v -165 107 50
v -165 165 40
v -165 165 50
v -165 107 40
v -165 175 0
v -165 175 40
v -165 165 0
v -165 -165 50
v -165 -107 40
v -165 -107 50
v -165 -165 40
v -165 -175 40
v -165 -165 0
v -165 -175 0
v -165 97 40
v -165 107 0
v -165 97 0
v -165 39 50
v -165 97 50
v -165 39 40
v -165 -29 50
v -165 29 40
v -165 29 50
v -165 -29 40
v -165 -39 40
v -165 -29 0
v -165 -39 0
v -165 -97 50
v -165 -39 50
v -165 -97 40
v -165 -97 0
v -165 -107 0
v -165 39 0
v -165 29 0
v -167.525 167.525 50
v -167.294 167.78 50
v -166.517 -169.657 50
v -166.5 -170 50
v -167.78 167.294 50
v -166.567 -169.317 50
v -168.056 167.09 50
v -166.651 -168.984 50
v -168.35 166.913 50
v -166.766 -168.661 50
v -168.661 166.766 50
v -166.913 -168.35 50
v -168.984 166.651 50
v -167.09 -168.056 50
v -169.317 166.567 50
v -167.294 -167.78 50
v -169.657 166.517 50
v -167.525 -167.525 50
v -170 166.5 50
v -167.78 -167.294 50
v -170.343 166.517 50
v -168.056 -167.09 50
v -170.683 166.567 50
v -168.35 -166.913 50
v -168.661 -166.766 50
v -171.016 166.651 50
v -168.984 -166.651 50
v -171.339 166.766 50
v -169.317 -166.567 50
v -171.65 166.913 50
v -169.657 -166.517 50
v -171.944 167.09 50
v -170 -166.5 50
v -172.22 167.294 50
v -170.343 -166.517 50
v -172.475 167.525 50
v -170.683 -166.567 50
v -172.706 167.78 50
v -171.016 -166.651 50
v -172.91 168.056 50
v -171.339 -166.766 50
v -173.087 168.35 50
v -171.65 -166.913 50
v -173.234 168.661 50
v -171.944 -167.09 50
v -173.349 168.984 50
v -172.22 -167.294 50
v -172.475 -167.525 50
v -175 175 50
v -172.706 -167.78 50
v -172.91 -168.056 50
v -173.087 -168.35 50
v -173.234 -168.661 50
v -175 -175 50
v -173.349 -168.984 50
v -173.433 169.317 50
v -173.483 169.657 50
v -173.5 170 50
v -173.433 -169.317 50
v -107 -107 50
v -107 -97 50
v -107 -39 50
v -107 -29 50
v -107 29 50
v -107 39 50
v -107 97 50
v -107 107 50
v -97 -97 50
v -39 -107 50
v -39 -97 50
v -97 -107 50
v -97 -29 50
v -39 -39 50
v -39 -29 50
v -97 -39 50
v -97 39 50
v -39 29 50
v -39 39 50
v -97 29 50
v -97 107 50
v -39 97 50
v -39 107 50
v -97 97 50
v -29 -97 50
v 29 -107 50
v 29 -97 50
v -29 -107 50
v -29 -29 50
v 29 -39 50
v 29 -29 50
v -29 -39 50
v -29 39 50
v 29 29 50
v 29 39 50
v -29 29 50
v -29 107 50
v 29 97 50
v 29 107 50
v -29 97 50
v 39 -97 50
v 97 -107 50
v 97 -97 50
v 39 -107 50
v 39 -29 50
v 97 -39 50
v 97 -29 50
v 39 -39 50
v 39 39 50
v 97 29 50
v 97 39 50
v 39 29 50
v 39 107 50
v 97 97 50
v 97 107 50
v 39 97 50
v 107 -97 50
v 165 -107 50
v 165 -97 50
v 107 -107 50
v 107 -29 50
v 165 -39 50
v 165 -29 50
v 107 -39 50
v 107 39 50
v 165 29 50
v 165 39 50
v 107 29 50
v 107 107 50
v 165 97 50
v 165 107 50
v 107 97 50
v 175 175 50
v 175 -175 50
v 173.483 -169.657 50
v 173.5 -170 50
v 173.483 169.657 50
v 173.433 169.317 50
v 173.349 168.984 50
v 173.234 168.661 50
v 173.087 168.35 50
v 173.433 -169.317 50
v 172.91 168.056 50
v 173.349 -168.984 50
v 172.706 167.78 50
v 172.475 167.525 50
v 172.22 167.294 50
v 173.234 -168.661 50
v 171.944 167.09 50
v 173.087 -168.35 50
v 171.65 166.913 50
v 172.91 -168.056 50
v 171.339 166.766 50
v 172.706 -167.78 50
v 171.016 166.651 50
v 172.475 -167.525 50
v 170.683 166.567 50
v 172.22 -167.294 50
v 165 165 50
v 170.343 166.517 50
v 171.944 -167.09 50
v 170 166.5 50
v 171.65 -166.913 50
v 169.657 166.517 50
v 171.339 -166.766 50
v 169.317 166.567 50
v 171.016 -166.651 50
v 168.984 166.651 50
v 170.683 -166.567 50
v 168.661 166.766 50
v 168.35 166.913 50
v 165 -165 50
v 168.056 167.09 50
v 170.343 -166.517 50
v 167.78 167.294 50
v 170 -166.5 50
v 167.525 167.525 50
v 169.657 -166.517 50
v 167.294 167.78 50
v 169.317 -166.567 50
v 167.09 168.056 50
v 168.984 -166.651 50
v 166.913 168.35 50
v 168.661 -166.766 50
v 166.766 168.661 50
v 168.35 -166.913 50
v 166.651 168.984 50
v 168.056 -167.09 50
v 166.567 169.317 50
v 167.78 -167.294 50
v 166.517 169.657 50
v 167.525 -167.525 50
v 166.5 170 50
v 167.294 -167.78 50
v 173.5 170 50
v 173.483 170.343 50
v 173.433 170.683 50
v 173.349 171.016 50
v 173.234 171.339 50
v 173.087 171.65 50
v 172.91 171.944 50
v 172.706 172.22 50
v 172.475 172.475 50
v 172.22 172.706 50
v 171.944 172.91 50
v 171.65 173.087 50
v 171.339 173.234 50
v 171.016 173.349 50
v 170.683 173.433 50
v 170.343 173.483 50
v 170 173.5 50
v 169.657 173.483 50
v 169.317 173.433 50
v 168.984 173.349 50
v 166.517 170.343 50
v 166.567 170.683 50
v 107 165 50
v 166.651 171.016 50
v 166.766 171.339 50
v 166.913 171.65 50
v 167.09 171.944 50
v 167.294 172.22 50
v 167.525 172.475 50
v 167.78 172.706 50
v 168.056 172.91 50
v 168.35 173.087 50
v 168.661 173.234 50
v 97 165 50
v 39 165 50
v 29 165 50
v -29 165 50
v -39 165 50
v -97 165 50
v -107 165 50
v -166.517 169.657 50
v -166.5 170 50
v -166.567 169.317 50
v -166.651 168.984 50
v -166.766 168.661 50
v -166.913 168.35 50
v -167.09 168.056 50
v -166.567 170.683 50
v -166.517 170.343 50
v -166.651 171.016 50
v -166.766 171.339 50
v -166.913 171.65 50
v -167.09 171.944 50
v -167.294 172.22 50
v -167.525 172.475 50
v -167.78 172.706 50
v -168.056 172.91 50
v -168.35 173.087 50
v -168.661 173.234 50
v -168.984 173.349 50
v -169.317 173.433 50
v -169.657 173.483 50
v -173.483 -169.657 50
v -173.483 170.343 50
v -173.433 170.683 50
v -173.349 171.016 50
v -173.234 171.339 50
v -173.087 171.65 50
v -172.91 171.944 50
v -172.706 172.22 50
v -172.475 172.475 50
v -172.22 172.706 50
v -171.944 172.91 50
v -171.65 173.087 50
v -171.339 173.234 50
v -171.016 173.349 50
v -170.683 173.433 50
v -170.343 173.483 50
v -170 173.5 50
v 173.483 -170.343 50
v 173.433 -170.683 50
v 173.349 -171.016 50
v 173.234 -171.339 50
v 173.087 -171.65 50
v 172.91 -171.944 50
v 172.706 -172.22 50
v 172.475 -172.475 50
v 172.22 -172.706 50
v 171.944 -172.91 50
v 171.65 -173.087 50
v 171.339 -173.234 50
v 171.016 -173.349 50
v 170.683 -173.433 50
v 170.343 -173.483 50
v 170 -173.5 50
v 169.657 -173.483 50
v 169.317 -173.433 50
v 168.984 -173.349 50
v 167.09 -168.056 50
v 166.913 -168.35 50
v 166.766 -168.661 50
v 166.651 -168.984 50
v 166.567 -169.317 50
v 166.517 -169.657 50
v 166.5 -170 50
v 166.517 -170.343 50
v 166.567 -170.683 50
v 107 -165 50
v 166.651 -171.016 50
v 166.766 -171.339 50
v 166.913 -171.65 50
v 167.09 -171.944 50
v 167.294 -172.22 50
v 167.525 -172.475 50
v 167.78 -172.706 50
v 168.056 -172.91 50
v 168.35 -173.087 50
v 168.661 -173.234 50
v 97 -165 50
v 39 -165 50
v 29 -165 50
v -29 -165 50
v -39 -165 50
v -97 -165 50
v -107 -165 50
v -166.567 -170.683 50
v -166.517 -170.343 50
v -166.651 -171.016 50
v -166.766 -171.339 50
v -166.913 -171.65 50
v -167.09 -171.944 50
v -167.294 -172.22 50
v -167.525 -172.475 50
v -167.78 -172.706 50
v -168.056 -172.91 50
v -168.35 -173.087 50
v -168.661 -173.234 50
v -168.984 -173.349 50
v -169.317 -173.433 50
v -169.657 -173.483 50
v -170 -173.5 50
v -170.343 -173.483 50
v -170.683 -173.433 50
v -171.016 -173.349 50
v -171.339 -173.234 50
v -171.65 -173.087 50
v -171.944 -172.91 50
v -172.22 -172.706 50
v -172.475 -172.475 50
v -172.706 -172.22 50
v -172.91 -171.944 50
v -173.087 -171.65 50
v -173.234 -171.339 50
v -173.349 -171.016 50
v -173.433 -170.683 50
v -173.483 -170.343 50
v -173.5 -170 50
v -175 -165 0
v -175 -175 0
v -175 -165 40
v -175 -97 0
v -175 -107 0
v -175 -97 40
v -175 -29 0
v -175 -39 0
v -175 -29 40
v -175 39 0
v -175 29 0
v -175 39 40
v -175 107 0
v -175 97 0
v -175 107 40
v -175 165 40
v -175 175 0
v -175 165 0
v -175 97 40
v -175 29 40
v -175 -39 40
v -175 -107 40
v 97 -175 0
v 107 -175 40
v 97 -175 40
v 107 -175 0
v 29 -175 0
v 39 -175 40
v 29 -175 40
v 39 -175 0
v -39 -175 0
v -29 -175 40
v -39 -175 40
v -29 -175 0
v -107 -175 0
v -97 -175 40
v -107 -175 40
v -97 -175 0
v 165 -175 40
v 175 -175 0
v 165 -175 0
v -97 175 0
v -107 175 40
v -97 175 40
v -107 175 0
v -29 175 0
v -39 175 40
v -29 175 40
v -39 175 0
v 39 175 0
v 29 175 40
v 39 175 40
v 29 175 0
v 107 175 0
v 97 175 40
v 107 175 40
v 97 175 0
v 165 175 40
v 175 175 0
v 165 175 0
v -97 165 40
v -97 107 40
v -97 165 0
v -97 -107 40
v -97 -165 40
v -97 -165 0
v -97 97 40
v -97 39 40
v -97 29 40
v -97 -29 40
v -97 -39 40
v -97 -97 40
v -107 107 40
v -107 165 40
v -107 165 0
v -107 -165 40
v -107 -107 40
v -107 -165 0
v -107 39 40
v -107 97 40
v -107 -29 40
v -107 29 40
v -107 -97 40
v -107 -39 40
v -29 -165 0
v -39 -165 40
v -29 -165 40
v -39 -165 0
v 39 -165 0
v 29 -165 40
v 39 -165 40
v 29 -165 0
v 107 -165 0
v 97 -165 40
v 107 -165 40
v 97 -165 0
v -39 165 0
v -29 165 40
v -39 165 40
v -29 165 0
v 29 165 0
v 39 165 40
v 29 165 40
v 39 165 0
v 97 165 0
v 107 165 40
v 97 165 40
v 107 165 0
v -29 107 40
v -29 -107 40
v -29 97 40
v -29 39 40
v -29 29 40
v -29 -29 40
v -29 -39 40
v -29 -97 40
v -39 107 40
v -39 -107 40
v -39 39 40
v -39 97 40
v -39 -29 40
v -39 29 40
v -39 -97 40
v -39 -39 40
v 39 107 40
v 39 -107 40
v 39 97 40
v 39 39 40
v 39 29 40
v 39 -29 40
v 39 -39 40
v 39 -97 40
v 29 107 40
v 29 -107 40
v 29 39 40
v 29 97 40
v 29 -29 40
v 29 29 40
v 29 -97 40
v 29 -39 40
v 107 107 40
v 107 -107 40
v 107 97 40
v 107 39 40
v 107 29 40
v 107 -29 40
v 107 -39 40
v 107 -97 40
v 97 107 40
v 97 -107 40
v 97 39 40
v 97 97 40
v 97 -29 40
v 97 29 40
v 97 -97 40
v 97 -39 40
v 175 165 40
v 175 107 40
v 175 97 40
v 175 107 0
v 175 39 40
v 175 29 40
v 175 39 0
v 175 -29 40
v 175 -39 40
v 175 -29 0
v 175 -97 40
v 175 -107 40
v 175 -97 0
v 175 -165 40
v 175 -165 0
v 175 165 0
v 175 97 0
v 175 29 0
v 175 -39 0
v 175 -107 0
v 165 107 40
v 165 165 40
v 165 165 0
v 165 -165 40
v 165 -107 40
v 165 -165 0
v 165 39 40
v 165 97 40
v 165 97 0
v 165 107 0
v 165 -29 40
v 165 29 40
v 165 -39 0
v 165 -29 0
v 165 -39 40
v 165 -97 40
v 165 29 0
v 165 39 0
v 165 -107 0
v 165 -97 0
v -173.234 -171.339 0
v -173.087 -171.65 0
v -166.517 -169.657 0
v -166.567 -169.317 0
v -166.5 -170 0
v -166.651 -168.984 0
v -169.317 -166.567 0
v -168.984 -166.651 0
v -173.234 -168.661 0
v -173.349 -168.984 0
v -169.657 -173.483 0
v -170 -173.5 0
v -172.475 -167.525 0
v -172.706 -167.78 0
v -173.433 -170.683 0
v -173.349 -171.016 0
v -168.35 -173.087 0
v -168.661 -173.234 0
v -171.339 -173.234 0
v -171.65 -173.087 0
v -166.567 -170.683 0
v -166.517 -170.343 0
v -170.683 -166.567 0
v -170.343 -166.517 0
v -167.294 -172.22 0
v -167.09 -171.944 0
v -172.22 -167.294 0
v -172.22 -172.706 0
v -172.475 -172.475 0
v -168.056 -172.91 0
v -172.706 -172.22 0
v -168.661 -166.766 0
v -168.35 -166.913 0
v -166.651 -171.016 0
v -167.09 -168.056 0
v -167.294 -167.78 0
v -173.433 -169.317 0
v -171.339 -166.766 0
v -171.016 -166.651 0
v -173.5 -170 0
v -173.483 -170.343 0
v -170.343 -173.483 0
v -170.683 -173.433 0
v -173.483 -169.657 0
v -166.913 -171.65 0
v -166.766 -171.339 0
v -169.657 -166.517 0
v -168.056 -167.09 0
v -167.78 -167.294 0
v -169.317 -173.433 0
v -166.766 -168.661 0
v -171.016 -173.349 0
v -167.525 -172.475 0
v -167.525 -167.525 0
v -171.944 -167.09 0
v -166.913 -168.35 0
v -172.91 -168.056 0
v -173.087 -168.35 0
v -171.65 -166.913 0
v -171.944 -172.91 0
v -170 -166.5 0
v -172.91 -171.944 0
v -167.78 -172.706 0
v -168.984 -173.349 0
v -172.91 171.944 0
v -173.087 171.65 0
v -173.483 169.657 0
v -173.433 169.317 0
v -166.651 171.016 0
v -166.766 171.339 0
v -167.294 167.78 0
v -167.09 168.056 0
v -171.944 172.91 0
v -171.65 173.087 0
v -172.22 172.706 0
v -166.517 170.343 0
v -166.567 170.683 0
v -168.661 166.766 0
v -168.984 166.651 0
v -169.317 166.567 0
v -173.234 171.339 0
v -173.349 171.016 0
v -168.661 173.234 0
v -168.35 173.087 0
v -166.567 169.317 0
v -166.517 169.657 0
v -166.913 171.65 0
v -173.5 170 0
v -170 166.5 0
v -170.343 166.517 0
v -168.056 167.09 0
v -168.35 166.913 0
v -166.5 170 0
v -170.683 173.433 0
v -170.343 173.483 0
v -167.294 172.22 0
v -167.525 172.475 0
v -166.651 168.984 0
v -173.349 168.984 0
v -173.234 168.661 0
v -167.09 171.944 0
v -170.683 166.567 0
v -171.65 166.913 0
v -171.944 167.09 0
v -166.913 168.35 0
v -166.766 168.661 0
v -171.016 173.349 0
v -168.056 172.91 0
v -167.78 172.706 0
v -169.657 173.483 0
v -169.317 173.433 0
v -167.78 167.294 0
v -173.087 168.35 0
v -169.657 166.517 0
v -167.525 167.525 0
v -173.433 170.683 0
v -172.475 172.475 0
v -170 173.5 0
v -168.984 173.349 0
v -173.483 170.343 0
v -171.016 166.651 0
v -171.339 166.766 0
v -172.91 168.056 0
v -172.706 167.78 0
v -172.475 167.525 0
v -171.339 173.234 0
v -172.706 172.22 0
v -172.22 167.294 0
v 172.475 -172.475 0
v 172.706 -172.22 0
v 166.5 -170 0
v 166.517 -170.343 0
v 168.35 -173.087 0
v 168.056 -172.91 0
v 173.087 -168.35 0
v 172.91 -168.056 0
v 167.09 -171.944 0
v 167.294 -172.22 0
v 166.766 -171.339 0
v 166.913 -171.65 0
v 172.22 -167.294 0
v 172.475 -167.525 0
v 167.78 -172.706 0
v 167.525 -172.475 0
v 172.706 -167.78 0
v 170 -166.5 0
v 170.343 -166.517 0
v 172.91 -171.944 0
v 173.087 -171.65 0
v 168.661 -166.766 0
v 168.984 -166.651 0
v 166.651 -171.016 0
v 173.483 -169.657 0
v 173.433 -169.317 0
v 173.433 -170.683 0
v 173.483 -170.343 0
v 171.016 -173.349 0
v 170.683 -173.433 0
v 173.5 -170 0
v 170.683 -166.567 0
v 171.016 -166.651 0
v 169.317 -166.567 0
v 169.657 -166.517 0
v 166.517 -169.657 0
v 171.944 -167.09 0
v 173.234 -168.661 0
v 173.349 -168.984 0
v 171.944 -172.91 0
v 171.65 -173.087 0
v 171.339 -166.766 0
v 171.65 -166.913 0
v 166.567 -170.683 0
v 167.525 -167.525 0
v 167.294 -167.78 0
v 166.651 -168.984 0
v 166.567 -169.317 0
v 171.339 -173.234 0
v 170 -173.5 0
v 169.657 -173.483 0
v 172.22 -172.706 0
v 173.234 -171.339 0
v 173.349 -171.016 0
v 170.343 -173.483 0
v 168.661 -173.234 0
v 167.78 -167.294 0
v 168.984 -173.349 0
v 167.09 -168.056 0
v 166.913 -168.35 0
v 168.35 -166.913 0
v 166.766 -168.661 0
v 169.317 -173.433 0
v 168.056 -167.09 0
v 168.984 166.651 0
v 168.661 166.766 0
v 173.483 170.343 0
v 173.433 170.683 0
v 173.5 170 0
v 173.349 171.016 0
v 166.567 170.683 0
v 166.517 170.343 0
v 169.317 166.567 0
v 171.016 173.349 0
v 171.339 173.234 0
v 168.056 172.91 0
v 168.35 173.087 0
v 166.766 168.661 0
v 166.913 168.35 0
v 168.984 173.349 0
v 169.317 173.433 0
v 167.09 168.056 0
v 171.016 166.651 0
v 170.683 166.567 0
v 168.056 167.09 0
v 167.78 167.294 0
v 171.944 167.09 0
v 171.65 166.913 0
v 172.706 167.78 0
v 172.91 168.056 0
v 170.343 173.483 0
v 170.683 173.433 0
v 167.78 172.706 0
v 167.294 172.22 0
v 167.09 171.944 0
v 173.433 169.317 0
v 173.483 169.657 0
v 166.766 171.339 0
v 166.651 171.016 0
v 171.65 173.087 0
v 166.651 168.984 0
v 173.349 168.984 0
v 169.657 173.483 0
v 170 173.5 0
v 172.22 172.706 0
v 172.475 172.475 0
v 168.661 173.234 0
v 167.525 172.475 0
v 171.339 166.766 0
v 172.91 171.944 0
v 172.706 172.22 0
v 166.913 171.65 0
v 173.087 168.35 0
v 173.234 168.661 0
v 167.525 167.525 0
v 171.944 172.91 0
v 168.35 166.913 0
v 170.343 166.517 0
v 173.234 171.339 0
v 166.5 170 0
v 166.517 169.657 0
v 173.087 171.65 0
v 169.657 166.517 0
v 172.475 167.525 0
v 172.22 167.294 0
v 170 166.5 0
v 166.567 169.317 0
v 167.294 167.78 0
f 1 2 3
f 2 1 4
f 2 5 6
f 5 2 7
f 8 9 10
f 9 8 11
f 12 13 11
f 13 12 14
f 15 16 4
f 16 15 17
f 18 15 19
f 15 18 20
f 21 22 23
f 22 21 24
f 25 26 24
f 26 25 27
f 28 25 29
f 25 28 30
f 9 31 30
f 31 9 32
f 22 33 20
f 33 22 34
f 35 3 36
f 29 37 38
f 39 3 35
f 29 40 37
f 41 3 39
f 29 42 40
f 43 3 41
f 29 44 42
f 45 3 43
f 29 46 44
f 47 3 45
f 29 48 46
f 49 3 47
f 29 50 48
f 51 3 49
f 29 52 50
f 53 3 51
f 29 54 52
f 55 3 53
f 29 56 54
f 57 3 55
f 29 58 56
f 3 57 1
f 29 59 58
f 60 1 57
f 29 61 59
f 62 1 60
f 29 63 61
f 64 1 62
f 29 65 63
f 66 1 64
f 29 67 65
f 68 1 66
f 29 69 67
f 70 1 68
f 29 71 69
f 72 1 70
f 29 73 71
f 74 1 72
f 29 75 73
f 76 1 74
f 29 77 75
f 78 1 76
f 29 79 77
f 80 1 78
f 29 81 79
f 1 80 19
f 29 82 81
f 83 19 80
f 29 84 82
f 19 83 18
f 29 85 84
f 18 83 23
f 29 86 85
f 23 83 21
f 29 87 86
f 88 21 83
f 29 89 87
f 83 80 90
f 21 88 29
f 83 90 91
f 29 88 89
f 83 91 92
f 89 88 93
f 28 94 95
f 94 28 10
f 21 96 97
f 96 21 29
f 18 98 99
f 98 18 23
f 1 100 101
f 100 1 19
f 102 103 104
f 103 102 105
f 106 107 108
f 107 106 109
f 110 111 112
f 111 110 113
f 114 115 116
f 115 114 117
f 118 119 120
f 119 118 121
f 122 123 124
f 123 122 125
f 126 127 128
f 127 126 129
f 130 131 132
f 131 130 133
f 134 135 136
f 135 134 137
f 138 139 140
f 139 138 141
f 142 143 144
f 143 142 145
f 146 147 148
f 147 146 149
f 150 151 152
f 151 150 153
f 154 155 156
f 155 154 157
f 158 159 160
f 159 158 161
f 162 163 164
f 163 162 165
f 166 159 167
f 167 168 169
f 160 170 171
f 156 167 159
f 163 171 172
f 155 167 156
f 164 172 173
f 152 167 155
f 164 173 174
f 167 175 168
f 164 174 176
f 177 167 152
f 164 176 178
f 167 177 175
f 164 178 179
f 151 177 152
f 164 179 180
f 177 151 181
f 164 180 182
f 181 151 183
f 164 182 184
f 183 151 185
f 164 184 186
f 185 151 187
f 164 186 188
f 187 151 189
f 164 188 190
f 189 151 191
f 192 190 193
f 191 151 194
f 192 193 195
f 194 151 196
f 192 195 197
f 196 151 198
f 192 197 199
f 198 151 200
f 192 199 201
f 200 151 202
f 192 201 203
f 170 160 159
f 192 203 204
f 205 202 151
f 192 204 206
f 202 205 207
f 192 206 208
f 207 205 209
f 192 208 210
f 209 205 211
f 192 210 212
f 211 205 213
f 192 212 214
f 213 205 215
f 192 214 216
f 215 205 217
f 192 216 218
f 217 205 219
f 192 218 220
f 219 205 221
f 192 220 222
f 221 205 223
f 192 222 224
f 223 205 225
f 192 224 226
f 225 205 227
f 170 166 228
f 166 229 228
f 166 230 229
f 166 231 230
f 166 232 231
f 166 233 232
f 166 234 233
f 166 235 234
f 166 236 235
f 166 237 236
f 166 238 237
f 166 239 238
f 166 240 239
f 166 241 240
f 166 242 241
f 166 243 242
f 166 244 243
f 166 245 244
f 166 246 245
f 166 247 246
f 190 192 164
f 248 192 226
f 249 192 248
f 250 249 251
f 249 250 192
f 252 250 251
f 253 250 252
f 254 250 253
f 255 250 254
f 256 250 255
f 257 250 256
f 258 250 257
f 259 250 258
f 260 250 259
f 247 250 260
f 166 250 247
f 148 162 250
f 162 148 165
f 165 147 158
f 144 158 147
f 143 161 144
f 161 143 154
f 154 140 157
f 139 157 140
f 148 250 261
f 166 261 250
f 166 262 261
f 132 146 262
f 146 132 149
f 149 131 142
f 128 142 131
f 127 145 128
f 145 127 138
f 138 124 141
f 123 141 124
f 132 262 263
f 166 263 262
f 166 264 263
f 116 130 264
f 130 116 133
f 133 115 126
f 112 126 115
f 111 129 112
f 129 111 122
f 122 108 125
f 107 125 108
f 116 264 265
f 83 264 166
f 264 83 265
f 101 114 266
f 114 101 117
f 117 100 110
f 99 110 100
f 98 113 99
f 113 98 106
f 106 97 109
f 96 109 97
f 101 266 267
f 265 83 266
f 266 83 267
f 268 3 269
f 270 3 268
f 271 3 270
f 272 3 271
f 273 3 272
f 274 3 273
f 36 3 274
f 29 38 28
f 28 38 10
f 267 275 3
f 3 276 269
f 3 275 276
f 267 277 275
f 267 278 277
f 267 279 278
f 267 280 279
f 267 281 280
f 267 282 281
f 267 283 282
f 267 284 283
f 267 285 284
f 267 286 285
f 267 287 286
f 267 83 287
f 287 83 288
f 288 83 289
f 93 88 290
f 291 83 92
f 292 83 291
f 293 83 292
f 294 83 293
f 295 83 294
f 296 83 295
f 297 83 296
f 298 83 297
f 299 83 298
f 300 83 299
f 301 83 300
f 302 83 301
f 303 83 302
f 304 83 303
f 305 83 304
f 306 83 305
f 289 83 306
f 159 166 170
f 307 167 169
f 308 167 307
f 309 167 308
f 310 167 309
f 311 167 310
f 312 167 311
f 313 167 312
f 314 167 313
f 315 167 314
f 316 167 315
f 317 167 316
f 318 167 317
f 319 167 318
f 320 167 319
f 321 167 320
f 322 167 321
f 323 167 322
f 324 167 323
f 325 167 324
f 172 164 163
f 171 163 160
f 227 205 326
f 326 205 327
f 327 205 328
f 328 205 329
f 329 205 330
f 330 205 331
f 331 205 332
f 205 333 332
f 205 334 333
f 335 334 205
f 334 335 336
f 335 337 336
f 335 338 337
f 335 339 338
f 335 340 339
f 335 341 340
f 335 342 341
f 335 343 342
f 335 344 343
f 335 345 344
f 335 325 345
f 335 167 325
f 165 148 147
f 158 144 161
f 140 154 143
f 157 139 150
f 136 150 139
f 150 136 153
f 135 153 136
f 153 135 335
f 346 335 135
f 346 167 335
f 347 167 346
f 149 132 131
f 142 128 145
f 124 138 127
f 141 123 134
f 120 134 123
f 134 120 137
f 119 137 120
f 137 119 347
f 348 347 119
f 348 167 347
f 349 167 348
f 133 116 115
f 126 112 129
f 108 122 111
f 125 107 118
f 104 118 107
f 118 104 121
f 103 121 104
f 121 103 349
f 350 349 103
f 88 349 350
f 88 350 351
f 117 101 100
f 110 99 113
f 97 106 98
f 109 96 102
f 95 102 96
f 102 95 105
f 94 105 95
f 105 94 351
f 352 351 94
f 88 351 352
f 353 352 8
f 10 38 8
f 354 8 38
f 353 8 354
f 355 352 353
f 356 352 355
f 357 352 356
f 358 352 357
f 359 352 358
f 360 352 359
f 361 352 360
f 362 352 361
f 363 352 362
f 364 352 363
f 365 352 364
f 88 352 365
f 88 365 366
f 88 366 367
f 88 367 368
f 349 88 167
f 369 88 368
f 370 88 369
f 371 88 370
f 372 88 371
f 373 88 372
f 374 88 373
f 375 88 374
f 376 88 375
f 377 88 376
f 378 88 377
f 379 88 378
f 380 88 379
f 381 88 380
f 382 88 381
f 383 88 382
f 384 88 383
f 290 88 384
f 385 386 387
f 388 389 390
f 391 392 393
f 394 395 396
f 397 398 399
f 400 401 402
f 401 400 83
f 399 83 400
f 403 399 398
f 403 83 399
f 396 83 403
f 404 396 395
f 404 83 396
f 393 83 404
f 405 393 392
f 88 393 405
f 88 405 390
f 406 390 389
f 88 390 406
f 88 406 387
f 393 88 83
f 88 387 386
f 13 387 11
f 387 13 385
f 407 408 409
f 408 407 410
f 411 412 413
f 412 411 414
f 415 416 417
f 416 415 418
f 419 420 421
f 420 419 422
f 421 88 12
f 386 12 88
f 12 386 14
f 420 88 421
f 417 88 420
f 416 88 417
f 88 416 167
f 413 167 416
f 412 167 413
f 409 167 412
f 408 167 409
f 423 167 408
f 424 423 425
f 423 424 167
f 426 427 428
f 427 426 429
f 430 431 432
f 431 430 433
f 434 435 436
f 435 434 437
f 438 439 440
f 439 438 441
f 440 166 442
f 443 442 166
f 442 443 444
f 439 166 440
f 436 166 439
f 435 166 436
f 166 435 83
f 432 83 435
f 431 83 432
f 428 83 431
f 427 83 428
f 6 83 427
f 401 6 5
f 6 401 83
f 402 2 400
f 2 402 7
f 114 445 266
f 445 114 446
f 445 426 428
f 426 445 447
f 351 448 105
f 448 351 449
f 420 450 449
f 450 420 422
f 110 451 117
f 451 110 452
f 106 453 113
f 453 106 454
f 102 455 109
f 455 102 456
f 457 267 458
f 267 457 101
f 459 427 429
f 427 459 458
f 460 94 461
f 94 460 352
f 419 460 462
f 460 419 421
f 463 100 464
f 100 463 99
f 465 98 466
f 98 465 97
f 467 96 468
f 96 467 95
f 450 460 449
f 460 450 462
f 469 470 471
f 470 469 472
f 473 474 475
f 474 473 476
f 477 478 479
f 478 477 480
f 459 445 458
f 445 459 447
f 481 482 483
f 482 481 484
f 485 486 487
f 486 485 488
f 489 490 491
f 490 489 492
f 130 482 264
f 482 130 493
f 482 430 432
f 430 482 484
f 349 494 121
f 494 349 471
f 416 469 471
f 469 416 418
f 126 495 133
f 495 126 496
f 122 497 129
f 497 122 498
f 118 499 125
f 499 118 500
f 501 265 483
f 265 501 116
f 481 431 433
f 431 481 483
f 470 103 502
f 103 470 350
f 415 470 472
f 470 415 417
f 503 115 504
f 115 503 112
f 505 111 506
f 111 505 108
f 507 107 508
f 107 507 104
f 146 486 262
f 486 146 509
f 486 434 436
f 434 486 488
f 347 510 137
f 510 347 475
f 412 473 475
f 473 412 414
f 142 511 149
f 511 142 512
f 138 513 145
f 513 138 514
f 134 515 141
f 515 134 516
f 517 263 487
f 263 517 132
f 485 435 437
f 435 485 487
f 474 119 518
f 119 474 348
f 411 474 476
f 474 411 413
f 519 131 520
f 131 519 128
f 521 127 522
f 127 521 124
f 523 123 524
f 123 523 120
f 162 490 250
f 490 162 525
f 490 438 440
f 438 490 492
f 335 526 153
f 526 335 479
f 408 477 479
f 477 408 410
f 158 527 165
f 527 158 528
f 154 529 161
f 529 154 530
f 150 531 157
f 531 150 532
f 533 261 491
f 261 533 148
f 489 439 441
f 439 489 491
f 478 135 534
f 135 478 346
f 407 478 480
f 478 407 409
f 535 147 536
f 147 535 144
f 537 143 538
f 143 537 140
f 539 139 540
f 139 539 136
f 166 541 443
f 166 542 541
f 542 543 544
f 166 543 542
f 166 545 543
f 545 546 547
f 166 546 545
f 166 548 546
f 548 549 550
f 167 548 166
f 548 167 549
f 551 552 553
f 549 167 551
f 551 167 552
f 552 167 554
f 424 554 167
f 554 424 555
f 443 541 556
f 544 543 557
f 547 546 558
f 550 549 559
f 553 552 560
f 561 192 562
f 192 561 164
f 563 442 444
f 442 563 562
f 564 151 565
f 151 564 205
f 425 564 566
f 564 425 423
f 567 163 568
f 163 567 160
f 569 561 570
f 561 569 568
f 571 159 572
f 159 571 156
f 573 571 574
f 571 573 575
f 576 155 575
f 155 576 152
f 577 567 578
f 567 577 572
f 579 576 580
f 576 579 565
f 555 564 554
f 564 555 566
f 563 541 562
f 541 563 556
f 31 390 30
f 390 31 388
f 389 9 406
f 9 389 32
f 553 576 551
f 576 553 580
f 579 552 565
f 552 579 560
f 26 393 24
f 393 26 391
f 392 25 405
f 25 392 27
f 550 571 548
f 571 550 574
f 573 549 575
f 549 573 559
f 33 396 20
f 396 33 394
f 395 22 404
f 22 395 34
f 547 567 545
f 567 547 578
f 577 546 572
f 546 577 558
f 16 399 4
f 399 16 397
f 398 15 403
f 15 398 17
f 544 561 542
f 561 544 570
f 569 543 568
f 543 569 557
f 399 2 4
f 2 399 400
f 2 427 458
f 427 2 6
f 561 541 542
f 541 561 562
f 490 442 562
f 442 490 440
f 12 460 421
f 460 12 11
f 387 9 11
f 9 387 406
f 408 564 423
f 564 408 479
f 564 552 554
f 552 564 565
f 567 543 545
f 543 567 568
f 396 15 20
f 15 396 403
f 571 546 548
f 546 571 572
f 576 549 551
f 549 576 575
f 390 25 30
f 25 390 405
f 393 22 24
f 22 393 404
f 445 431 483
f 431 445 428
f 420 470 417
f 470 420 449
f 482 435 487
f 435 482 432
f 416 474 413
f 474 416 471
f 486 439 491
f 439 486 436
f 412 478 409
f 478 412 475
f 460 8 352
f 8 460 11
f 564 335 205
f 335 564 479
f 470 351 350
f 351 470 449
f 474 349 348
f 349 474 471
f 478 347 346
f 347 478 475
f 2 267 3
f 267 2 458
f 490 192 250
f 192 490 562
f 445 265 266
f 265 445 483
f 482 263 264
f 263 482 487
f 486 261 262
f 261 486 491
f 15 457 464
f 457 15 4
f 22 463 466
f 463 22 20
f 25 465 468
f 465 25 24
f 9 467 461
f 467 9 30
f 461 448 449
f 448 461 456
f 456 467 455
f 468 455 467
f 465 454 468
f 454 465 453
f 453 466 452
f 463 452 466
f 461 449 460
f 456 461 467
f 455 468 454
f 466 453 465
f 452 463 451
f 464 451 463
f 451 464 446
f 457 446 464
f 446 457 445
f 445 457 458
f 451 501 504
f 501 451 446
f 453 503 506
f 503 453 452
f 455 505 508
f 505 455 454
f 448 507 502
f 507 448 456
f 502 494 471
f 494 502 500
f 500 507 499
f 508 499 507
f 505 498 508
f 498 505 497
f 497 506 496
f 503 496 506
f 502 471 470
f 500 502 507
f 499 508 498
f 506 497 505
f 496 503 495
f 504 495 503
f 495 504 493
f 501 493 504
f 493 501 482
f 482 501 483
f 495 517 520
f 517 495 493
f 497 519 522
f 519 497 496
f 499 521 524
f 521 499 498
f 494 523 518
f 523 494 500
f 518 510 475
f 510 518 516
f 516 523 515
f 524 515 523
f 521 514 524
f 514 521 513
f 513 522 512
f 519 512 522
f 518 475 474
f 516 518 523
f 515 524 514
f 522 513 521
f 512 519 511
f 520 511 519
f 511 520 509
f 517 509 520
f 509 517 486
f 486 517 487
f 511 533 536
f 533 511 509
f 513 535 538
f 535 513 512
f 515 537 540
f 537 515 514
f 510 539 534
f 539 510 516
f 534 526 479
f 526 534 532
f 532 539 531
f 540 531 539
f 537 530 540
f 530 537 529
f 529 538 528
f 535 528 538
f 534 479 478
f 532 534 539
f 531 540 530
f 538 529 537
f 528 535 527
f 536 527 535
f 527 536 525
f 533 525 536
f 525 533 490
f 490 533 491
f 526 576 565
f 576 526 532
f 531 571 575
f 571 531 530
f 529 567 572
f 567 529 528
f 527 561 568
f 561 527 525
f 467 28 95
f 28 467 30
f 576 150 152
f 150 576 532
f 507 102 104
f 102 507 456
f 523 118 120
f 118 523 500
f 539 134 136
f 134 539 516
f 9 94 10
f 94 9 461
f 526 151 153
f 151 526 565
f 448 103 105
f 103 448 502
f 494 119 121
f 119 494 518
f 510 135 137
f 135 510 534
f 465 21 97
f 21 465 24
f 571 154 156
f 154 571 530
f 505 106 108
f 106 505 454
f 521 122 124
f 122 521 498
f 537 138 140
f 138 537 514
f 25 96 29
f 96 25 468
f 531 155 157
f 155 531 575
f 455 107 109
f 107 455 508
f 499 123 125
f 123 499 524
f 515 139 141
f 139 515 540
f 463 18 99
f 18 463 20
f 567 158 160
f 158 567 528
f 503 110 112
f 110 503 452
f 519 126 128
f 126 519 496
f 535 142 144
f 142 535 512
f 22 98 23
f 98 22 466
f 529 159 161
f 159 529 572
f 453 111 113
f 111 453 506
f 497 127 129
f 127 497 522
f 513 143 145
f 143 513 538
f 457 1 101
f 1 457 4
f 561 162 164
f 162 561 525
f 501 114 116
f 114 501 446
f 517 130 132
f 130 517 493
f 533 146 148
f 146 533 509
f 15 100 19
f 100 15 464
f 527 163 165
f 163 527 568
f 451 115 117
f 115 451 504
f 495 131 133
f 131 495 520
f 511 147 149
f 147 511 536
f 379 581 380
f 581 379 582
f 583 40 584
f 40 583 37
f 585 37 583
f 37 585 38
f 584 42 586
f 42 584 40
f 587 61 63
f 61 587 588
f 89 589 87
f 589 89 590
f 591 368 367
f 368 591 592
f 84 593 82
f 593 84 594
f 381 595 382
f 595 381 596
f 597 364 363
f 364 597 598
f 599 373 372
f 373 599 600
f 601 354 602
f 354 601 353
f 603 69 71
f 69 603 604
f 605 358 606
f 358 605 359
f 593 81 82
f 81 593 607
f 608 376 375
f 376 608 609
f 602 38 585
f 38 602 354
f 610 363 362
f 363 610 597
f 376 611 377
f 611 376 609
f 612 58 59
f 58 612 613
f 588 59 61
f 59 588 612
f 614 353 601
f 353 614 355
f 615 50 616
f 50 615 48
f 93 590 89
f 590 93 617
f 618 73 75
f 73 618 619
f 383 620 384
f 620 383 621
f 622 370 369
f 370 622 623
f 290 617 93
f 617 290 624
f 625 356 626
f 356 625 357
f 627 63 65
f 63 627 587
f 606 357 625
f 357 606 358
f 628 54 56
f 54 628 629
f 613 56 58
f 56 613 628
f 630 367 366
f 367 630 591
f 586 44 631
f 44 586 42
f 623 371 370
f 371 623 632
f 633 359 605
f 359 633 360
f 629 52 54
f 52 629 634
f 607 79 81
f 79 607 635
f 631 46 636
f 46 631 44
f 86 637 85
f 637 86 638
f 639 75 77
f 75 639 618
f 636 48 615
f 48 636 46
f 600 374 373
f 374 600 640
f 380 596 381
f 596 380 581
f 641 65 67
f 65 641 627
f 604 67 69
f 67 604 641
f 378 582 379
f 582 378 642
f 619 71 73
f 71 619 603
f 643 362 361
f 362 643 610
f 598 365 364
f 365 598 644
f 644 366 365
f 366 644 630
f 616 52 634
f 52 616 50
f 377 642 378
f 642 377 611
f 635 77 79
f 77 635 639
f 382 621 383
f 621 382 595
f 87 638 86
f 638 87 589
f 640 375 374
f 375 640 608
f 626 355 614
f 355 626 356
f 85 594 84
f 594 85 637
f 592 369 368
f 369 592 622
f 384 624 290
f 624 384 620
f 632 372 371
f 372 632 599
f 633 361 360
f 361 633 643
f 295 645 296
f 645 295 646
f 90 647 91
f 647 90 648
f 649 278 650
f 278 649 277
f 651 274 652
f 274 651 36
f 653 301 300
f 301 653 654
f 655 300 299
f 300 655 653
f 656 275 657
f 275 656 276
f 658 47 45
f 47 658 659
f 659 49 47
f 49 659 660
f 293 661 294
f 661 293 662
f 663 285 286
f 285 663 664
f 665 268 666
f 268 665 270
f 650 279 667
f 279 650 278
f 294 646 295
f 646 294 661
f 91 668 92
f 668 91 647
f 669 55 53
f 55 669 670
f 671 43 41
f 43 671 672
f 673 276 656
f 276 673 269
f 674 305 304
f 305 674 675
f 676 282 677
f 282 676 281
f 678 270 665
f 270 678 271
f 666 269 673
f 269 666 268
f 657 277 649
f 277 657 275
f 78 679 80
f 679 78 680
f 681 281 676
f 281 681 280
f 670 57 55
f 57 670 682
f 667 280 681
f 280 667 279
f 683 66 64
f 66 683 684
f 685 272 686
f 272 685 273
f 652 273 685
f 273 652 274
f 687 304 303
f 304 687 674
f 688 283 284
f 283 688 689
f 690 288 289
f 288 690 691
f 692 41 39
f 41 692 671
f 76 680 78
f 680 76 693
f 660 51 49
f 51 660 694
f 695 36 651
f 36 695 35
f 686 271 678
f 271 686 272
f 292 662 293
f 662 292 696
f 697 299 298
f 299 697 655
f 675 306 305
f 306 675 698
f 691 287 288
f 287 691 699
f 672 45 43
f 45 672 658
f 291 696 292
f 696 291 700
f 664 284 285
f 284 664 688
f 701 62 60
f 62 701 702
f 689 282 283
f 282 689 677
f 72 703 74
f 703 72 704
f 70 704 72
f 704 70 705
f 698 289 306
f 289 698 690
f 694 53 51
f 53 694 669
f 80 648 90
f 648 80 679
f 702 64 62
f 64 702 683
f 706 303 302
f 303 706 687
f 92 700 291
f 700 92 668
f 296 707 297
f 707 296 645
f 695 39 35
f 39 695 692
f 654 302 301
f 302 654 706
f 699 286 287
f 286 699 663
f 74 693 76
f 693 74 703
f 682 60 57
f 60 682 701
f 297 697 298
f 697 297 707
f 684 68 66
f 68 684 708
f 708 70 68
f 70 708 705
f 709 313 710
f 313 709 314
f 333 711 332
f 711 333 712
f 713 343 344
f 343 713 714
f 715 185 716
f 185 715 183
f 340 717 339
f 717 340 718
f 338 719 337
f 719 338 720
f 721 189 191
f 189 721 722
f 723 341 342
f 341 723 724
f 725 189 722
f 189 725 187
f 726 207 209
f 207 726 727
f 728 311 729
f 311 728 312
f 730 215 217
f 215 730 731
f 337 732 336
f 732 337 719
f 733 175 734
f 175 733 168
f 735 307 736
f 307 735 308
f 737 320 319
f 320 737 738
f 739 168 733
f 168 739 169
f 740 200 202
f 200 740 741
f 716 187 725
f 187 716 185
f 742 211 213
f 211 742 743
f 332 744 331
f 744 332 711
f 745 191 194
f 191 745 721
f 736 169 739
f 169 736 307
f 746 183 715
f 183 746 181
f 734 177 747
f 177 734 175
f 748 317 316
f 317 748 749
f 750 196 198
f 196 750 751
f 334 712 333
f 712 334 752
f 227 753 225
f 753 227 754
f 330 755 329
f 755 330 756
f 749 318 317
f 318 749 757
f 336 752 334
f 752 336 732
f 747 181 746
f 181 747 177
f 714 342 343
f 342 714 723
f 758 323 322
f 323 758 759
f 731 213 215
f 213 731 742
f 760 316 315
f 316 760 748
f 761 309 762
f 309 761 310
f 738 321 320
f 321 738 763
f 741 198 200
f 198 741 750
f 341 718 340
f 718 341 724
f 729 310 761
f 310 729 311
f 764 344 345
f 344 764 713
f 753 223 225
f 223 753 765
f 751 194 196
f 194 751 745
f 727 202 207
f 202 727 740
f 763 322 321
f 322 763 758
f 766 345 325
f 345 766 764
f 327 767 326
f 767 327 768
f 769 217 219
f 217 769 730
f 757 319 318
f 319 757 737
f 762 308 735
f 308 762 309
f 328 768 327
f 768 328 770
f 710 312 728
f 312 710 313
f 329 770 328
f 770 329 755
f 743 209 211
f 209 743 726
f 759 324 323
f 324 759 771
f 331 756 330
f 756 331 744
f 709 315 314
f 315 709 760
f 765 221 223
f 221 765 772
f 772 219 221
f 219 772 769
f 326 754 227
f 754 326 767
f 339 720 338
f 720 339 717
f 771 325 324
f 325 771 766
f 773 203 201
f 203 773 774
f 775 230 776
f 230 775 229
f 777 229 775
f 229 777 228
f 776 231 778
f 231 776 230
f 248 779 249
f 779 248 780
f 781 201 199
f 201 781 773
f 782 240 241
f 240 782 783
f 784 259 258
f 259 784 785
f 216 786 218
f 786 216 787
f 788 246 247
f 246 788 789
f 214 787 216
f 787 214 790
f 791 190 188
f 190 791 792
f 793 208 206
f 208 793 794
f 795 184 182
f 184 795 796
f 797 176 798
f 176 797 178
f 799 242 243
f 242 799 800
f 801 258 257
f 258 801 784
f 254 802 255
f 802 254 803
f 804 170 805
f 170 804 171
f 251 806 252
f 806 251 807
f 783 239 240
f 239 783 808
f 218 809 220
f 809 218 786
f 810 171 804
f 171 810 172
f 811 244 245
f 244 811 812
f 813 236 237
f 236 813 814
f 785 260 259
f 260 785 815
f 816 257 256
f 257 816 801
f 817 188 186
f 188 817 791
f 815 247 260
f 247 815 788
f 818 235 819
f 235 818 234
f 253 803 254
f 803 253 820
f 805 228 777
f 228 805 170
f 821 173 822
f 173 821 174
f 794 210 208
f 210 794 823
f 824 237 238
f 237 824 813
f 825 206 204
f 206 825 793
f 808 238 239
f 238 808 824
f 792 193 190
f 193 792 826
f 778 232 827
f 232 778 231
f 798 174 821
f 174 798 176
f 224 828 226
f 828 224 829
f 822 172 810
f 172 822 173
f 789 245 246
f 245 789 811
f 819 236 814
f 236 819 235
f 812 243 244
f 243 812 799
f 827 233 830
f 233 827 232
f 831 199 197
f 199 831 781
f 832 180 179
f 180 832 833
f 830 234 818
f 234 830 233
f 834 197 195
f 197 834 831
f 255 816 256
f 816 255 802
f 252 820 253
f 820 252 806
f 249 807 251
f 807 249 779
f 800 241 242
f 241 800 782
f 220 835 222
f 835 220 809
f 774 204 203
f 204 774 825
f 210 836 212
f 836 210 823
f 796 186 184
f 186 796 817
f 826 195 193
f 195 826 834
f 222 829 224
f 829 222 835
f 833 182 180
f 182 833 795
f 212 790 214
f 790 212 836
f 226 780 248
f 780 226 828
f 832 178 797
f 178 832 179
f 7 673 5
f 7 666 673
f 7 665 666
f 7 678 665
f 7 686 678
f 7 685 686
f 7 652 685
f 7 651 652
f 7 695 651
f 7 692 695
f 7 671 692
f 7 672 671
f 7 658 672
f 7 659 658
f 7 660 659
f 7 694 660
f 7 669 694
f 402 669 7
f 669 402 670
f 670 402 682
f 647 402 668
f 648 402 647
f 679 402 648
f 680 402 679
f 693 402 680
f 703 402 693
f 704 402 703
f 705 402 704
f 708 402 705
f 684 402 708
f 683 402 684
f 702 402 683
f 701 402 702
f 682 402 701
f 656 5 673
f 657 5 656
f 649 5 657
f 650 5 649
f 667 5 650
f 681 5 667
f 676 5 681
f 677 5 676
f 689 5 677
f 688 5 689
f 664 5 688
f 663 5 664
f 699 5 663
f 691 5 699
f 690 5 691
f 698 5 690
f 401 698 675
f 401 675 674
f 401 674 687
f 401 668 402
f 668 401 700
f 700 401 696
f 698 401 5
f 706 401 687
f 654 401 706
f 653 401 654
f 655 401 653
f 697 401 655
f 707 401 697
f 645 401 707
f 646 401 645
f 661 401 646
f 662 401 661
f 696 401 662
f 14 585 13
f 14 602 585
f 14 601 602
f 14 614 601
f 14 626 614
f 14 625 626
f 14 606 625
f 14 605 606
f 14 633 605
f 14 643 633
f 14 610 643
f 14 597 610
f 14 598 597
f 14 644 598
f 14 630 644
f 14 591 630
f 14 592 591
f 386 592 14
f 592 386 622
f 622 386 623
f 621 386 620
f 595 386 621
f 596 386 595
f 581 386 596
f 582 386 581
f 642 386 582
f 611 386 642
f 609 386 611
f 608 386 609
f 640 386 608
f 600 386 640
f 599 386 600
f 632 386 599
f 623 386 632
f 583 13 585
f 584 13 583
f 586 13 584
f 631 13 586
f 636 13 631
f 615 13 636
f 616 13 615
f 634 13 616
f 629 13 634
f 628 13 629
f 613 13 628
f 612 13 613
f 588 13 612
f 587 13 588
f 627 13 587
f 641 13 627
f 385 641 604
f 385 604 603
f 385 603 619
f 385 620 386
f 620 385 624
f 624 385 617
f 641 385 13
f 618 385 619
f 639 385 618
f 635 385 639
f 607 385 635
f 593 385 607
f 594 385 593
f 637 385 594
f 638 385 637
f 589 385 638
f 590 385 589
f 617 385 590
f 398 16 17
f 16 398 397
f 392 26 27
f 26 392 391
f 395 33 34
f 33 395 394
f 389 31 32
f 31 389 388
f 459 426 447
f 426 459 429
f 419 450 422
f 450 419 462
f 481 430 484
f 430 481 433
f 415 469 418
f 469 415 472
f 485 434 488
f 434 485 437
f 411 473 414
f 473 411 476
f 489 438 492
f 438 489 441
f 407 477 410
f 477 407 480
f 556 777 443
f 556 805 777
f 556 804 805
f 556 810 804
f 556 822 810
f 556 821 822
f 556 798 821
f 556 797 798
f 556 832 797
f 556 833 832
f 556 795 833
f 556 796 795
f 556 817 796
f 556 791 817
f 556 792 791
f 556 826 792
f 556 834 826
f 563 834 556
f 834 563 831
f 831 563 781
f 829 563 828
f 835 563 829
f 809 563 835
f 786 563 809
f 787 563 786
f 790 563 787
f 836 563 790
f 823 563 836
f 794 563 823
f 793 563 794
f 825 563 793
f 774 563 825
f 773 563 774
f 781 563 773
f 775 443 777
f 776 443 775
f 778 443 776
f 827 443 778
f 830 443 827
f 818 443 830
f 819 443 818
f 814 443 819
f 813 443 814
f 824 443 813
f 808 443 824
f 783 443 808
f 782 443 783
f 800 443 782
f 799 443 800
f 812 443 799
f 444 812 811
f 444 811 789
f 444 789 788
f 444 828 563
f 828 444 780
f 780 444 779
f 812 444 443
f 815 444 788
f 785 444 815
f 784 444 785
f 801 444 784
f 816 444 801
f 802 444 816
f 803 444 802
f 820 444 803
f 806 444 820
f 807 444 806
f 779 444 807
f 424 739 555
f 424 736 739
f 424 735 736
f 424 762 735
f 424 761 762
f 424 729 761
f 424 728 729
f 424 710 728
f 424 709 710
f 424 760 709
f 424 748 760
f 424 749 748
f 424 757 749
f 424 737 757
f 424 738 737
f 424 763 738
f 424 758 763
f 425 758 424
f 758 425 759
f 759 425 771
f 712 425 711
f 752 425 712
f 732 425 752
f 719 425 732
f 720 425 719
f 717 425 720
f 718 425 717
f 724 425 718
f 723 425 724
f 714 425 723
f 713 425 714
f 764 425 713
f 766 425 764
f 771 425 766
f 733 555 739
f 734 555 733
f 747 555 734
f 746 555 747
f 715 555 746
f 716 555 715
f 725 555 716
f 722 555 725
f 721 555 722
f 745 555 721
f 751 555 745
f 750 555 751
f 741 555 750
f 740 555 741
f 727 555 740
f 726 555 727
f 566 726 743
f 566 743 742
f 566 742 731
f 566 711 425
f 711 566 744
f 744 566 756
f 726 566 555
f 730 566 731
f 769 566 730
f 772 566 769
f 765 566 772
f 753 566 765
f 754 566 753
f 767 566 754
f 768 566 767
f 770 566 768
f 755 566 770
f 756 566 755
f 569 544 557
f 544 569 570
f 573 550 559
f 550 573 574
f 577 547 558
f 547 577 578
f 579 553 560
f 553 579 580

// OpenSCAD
// Cage slice - index 13 (top)
bar = 10;
outer = 350;
half = outer / 2;
height = 700;

N_xy = 6;
N_z  = 11;

x_spacing = (outer - bar) / (N_xy - 1);
z_spacing = (height - bar) / (N_z  - 1);

xs = [ for (i = [0 : N_xy - 1]) (-half + bar/2 + i * x_spacing) ];
ys = xs;

zs = [ for (k = [0 : N_z - 1]) (bar/2 + k * z_spacing) ];

$fn = 64;

module cage_bars() {
    union() {
        // Vertical bars on front and back faces
        for (xv = xs) {
            translate([xv, -half + bar/2, height/2])
                cube([bar, bar, height], center = true);
            translate([xv,  half - bar/2, height/2])
                cube([bar, bar, height], center = true);
        }

        // Vertical bars on left and right faces
        for (yv = ys) {
            translate([-half + bar/2, yv, height/2])
                cube([bar, bar, height], center = true);
            translate([ half - bar/2, yv, height/2])
                cube([bar, bar, height], center = true);
        }

        // Horizontal x-bars on front and back faces
        for (zv = zs) {
            translate([0, -half + bar/2, zv])
                cube([outer, bar, bar], center = true);
            translate([0,  half - bar/2, zv])
                cube([outer, bar, bar], center = true);
        }

        // Horizontal y-bars on left and right faces
        for (zv = zs) {
            translate([-half + bar/2, 0, zv])
                cube([bar, outer, bar], center = true);
            translate([ half - bar/2, 0, zv])
                cube([bar, outer, bar], center = true);
        }

        // Floor and ceiling extra x-bars at all y positions
        z_floor = bar/2;
        z_ceil  = height - bar/2;
        for (yv = ys) {
            translate([0, yv, z_floor])
                cube([outer, bar, bar], center = true);
            translate([0, yv, z_ceil])
                cube([outer, bar, bar], center = true);
        }

        // Floor and ceiling extra y-bars at all x positions
        for (xv = xs) {
            translate([xv, 0, z_floor])
                cube([bar, outer, bar], center = true);
            translate([xv, 0, z_ceil])
                cube([bar, outer, bar], center = true);
        }
    }
}

module corner_holes() {
    hole_d = 7;
    for (sx = [-1, 1])
        for (sy = [-1, 1])
            translate([sx * (half - bar/2), sy * (half - bar/2), height/2])
                cylinder(h = height + 2, d = hole_d, center = true);
}

module cage_full() {
    difference() {
        cage_bars();
        corner_holes();
    }
}

slice_index = 13;
slice_height = 50;

module cage_slice() {
    translate([0, 0, -slice_index * slice_height]) {
        intersection() {
            cage_full();
            translate([0, 0, slice_index * slice_height + slice_height/2])
                cube([outer + 20, outer + 20, slice_height], center = true);
        }
    }
}

cage_slice();
